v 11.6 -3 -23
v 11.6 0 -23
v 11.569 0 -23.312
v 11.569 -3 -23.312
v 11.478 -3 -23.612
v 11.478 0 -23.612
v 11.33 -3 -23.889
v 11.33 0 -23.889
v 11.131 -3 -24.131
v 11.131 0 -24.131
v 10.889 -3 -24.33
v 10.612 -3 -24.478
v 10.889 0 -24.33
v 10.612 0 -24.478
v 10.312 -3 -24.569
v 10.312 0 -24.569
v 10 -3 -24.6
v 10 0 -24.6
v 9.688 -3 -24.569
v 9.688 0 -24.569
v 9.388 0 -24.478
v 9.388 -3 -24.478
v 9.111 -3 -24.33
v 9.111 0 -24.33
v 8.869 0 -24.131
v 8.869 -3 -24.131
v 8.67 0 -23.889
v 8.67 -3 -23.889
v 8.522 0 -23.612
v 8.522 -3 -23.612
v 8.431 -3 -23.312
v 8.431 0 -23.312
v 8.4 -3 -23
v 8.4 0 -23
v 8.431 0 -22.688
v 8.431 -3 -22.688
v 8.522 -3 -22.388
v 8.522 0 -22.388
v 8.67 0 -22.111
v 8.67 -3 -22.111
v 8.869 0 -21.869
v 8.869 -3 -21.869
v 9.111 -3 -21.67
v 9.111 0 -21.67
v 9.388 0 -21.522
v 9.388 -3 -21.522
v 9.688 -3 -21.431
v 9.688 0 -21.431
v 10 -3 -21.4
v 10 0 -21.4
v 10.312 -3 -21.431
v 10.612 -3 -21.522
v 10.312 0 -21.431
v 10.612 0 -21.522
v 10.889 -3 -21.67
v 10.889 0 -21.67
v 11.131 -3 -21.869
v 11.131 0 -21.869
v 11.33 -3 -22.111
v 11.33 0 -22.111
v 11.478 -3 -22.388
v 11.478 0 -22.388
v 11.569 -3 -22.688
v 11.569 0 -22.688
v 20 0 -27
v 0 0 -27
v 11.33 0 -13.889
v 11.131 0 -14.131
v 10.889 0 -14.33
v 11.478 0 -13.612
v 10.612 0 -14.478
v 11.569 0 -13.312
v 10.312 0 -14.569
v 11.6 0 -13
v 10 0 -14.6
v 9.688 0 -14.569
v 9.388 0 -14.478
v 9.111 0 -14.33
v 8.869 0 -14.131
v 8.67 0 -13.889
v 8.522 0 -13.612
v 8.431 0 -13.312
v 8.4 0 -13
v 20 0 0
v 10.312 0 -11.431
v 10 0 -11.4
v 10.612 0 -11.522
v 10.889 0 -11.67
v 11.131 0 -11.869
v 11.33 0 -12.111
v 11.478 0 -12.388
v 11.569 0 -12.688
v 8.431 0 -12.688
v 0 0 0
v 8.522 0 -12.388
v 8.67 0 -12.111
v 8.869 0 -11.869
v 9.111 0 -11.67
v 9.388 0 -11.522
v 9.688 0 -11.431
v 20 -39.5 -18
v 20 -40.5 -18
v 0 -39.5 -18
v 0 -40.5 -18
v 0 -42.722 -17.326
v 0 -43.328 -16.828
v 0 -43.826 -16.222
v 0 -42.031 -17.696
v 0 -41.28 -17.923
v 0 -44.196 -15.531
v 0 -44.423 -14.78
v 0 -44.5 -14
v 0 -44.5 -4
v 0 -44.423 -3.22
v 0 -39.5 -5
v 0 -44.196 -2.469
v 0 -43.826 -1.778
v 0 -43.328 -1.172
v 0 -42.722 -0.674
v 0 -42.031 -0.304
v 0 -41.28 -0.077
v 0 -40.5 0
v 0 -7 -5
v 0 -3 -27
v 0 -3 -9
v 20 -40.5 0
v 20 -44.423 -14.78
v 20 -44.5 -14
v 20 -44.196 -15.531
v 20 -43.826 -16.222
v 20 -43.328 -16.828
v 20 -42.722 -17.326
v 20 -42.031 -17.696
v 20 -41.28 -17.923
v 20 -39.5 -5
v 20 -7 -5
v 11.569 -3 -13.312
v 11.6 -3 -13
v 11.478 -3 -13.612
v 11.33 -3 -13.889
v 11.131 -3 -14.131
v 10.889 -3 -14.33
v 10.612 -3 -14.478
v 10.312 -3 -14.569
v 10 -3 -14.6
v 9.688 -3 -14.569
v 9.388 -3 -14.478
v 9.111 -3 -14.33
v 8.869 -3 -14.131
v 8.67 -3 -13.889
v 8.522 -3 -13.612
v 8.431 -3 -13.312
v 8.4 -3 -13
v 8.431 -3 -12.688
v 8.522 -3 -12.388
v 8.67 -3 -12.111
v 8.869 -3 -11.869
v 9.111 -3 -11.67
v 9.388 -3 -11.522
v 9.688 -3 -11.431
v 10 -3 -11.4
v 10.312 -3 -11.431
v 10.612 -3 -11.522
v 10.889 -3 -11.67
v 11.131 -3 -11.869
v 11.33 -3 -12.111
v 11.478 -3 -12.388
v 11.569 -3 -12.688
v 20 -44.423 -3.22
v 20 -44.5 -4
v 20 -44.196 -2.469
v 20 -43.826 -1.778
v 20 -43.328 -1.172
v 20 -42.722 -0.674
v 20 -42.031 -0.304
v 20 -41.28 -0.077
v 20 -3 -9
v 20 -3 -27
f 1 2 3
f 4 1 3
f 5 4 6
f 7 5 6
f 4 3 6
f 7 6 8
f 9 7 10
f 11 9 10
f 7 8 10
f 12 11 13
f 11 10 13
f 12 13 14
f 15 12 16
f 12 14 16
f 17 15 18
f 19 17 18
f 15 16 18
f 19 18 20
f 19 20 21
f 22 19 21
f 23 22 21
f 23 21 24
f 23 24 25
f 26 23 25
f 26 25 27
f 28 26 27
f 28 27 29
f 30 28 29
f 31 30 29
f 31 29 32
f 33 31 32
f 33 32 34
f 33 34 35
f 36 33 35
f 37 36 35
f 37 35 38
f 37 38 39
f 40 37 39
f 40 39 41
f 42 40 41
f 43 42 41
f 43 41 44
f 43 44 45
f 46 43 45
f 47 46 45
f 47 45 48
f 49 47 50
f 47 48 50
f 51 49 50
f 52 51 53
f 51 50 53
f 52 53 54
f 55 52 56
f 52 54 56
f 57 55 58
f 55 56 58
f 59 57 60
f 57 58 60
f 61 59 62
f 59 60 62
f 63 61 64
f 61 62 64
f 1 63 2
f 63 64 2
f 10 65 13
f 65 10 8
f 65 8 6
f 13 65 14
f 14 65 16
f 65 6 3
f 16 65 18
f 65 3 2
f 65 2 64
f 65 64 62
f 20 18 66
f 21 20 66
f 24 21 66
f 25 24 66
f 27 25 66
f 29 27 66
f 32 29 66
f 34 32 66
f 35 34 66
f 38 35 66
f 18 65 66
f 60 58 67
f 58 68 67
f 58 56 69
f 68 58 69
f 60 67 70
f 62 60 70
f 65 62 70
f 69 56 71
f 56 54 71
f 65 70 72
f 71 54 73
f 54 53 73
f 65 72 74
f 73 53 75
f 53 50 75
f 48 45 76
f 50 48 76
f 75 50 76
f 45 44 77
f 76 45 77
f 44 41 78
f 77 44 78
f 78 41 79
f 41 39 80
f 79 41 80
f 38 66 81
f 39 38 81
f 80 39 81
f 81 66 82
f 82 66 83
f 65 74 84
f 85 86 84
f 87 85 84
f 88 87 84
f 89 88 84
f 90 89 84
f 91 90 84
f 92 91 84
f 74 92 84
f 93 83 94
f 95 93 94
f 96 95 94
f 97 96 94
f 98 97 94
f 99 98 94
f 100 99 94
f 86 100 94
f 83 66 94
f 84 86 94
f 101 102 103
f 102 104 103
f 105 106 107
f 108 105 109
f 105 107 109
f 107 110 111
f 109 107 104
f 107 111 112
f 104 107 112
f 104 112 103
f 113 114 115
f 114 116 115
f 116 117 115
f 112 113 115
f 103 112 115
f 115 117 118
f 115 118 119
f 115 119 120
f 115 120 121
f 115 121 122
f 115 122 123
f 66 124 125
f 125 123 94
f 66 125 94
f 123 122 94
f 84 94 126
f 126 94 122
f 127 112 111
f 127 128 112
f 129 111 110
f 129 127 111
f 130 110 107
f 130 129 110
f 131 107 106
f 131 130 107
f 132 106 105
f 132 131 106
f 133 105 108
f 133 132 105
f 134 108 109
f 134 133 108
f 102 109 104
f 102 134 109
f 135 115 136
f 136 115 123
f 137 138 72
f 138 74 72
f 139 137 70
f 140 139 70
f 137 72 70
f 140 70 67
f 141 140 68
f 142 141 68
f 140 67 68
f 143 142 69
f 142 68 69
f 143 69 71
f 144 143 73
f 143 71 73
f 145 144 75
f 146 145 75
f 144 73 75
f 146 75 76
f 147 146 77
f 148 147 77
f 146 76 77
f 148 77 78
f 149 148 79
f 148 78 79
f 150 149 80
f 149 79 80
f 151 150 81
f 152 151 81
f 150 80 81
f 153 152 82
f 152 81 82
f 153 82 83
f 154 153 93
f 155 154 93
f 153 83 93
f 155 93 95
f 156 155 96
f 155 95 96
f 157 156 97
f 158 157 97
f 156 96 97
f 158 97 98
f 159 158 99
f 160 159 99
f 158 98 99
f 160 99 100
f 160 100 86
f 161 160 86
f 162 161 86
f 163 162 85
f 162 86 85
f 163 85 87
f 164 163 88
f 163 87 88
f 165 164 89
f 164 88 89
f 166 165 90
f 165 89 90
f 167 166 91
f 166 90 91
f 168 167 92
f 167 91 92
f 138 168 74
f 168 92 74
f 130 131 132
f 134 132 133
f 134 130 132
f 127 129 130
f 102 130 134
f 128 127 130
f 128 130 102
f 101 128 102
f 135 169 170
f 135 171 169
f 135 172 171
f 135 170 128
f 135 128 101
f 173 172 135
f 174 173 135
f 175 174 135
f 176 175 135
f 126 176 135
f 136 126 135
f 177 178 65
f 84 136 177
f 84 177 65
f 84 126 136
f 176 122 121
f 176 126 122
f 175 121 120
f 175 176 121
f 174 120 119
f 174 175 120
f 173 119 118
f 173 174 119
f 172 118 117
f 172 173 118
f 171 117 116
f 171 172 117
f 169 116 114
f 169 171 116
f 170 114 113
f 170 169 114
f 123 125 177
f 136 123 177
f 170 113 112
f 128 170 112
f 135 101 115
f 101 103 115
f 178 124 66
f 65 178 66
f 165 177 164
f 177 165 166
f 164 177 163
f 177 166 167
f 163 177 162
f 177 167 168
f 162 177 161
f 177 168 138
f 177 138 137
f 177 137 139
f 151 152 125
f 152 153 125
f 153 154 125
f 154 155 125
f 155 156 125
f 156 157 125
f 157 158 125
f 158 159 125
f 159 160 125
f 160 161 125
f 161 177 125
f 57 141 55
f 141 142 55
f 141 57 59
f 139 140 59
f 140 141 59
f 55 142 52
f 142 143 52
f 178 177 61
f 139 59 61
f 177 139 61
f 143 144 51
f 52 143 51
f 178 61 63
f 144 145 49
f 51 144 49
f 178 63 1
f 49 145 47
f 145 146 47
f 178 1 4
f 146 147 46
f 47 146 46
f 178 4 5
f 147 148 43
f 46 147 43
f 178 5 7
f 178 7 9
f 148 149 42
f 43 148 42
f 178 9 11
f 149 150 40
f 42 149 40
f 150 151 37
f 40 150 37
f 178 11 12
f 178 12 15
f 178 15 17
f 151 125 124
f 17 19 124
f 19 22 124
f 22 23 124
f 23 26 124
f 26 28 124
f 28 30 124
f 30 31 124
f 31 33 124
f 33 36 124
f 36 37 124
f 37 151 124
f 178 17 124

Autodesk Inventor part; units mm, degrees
ref_plane "YZ Plane" through (0, 0, 0) normal (1, 0, 0) x (0, 1, 0)
ref_plane "XZ Plane" through (0, 0, 0) normal (0, 1, 0) x (-1, 0, 0)
ref_plane "XY Plane" through (0, 0, 0) normal (0, 0, 1) x (1, 0, 0)
sketch "Sketch1" plane through (0, 0, 0) normal (1, 0, 0) x (0, 1, 0)
  line L0 (0, 0) -> (-44.5, 0)
  line L1 (-44.5, 0) -> (-44.5, -18)
  line L2 (-44.5, -18) -> (-39.5, -18)
  line L3 (-39.5, -18) -> (-39.5, -5)
  line L4 (-39.5, -5) -> (-3, -5)
  line L5 (-3, -5) -> (-3, -27)
  line L6 (-3, -27) -> (0, -27)
  line L7 (0, -27) -> (0, 0)
  dimension "d0" = 3
  dimension "d1" = 44.5
  dimension "d2" = 5
  dimension "d3" = 27
  dimension "d4" = 18
  dimension "d5" = 5
extrude "Extrusion1" add sketch "Sketch1" along normal blind 20
fillet "Fillet1" radius 4 2 edges at (10, -44.5, 0) (10, -44.5, -18)
chamfer "Chamfer1" distance 4 angle 45 1 edges at (10, -3, -5)
sketch "Sketch2" plane through (0, 0, 0) normal (0, 1, 0) x (1, 0, 0)
  circle A0 centre (10, 13) radius 1.6
  circle A1 centre (10, 23) radius 1.6
  line L0 (0, 0) -> (20, 0) construction
  line L1 (10, 0) -> (10, 27) construction
  line L2 (0, 27) -> (20, 27) construction
  dimension "d12" = 3.2
  dimension "d13" = 13
  dimension "d14" = 10
extrude "Extrusion2" cut sketch "Sketch2" against normal up to surface (3 mm away)
properties part number "Front_Skit_Plate"
